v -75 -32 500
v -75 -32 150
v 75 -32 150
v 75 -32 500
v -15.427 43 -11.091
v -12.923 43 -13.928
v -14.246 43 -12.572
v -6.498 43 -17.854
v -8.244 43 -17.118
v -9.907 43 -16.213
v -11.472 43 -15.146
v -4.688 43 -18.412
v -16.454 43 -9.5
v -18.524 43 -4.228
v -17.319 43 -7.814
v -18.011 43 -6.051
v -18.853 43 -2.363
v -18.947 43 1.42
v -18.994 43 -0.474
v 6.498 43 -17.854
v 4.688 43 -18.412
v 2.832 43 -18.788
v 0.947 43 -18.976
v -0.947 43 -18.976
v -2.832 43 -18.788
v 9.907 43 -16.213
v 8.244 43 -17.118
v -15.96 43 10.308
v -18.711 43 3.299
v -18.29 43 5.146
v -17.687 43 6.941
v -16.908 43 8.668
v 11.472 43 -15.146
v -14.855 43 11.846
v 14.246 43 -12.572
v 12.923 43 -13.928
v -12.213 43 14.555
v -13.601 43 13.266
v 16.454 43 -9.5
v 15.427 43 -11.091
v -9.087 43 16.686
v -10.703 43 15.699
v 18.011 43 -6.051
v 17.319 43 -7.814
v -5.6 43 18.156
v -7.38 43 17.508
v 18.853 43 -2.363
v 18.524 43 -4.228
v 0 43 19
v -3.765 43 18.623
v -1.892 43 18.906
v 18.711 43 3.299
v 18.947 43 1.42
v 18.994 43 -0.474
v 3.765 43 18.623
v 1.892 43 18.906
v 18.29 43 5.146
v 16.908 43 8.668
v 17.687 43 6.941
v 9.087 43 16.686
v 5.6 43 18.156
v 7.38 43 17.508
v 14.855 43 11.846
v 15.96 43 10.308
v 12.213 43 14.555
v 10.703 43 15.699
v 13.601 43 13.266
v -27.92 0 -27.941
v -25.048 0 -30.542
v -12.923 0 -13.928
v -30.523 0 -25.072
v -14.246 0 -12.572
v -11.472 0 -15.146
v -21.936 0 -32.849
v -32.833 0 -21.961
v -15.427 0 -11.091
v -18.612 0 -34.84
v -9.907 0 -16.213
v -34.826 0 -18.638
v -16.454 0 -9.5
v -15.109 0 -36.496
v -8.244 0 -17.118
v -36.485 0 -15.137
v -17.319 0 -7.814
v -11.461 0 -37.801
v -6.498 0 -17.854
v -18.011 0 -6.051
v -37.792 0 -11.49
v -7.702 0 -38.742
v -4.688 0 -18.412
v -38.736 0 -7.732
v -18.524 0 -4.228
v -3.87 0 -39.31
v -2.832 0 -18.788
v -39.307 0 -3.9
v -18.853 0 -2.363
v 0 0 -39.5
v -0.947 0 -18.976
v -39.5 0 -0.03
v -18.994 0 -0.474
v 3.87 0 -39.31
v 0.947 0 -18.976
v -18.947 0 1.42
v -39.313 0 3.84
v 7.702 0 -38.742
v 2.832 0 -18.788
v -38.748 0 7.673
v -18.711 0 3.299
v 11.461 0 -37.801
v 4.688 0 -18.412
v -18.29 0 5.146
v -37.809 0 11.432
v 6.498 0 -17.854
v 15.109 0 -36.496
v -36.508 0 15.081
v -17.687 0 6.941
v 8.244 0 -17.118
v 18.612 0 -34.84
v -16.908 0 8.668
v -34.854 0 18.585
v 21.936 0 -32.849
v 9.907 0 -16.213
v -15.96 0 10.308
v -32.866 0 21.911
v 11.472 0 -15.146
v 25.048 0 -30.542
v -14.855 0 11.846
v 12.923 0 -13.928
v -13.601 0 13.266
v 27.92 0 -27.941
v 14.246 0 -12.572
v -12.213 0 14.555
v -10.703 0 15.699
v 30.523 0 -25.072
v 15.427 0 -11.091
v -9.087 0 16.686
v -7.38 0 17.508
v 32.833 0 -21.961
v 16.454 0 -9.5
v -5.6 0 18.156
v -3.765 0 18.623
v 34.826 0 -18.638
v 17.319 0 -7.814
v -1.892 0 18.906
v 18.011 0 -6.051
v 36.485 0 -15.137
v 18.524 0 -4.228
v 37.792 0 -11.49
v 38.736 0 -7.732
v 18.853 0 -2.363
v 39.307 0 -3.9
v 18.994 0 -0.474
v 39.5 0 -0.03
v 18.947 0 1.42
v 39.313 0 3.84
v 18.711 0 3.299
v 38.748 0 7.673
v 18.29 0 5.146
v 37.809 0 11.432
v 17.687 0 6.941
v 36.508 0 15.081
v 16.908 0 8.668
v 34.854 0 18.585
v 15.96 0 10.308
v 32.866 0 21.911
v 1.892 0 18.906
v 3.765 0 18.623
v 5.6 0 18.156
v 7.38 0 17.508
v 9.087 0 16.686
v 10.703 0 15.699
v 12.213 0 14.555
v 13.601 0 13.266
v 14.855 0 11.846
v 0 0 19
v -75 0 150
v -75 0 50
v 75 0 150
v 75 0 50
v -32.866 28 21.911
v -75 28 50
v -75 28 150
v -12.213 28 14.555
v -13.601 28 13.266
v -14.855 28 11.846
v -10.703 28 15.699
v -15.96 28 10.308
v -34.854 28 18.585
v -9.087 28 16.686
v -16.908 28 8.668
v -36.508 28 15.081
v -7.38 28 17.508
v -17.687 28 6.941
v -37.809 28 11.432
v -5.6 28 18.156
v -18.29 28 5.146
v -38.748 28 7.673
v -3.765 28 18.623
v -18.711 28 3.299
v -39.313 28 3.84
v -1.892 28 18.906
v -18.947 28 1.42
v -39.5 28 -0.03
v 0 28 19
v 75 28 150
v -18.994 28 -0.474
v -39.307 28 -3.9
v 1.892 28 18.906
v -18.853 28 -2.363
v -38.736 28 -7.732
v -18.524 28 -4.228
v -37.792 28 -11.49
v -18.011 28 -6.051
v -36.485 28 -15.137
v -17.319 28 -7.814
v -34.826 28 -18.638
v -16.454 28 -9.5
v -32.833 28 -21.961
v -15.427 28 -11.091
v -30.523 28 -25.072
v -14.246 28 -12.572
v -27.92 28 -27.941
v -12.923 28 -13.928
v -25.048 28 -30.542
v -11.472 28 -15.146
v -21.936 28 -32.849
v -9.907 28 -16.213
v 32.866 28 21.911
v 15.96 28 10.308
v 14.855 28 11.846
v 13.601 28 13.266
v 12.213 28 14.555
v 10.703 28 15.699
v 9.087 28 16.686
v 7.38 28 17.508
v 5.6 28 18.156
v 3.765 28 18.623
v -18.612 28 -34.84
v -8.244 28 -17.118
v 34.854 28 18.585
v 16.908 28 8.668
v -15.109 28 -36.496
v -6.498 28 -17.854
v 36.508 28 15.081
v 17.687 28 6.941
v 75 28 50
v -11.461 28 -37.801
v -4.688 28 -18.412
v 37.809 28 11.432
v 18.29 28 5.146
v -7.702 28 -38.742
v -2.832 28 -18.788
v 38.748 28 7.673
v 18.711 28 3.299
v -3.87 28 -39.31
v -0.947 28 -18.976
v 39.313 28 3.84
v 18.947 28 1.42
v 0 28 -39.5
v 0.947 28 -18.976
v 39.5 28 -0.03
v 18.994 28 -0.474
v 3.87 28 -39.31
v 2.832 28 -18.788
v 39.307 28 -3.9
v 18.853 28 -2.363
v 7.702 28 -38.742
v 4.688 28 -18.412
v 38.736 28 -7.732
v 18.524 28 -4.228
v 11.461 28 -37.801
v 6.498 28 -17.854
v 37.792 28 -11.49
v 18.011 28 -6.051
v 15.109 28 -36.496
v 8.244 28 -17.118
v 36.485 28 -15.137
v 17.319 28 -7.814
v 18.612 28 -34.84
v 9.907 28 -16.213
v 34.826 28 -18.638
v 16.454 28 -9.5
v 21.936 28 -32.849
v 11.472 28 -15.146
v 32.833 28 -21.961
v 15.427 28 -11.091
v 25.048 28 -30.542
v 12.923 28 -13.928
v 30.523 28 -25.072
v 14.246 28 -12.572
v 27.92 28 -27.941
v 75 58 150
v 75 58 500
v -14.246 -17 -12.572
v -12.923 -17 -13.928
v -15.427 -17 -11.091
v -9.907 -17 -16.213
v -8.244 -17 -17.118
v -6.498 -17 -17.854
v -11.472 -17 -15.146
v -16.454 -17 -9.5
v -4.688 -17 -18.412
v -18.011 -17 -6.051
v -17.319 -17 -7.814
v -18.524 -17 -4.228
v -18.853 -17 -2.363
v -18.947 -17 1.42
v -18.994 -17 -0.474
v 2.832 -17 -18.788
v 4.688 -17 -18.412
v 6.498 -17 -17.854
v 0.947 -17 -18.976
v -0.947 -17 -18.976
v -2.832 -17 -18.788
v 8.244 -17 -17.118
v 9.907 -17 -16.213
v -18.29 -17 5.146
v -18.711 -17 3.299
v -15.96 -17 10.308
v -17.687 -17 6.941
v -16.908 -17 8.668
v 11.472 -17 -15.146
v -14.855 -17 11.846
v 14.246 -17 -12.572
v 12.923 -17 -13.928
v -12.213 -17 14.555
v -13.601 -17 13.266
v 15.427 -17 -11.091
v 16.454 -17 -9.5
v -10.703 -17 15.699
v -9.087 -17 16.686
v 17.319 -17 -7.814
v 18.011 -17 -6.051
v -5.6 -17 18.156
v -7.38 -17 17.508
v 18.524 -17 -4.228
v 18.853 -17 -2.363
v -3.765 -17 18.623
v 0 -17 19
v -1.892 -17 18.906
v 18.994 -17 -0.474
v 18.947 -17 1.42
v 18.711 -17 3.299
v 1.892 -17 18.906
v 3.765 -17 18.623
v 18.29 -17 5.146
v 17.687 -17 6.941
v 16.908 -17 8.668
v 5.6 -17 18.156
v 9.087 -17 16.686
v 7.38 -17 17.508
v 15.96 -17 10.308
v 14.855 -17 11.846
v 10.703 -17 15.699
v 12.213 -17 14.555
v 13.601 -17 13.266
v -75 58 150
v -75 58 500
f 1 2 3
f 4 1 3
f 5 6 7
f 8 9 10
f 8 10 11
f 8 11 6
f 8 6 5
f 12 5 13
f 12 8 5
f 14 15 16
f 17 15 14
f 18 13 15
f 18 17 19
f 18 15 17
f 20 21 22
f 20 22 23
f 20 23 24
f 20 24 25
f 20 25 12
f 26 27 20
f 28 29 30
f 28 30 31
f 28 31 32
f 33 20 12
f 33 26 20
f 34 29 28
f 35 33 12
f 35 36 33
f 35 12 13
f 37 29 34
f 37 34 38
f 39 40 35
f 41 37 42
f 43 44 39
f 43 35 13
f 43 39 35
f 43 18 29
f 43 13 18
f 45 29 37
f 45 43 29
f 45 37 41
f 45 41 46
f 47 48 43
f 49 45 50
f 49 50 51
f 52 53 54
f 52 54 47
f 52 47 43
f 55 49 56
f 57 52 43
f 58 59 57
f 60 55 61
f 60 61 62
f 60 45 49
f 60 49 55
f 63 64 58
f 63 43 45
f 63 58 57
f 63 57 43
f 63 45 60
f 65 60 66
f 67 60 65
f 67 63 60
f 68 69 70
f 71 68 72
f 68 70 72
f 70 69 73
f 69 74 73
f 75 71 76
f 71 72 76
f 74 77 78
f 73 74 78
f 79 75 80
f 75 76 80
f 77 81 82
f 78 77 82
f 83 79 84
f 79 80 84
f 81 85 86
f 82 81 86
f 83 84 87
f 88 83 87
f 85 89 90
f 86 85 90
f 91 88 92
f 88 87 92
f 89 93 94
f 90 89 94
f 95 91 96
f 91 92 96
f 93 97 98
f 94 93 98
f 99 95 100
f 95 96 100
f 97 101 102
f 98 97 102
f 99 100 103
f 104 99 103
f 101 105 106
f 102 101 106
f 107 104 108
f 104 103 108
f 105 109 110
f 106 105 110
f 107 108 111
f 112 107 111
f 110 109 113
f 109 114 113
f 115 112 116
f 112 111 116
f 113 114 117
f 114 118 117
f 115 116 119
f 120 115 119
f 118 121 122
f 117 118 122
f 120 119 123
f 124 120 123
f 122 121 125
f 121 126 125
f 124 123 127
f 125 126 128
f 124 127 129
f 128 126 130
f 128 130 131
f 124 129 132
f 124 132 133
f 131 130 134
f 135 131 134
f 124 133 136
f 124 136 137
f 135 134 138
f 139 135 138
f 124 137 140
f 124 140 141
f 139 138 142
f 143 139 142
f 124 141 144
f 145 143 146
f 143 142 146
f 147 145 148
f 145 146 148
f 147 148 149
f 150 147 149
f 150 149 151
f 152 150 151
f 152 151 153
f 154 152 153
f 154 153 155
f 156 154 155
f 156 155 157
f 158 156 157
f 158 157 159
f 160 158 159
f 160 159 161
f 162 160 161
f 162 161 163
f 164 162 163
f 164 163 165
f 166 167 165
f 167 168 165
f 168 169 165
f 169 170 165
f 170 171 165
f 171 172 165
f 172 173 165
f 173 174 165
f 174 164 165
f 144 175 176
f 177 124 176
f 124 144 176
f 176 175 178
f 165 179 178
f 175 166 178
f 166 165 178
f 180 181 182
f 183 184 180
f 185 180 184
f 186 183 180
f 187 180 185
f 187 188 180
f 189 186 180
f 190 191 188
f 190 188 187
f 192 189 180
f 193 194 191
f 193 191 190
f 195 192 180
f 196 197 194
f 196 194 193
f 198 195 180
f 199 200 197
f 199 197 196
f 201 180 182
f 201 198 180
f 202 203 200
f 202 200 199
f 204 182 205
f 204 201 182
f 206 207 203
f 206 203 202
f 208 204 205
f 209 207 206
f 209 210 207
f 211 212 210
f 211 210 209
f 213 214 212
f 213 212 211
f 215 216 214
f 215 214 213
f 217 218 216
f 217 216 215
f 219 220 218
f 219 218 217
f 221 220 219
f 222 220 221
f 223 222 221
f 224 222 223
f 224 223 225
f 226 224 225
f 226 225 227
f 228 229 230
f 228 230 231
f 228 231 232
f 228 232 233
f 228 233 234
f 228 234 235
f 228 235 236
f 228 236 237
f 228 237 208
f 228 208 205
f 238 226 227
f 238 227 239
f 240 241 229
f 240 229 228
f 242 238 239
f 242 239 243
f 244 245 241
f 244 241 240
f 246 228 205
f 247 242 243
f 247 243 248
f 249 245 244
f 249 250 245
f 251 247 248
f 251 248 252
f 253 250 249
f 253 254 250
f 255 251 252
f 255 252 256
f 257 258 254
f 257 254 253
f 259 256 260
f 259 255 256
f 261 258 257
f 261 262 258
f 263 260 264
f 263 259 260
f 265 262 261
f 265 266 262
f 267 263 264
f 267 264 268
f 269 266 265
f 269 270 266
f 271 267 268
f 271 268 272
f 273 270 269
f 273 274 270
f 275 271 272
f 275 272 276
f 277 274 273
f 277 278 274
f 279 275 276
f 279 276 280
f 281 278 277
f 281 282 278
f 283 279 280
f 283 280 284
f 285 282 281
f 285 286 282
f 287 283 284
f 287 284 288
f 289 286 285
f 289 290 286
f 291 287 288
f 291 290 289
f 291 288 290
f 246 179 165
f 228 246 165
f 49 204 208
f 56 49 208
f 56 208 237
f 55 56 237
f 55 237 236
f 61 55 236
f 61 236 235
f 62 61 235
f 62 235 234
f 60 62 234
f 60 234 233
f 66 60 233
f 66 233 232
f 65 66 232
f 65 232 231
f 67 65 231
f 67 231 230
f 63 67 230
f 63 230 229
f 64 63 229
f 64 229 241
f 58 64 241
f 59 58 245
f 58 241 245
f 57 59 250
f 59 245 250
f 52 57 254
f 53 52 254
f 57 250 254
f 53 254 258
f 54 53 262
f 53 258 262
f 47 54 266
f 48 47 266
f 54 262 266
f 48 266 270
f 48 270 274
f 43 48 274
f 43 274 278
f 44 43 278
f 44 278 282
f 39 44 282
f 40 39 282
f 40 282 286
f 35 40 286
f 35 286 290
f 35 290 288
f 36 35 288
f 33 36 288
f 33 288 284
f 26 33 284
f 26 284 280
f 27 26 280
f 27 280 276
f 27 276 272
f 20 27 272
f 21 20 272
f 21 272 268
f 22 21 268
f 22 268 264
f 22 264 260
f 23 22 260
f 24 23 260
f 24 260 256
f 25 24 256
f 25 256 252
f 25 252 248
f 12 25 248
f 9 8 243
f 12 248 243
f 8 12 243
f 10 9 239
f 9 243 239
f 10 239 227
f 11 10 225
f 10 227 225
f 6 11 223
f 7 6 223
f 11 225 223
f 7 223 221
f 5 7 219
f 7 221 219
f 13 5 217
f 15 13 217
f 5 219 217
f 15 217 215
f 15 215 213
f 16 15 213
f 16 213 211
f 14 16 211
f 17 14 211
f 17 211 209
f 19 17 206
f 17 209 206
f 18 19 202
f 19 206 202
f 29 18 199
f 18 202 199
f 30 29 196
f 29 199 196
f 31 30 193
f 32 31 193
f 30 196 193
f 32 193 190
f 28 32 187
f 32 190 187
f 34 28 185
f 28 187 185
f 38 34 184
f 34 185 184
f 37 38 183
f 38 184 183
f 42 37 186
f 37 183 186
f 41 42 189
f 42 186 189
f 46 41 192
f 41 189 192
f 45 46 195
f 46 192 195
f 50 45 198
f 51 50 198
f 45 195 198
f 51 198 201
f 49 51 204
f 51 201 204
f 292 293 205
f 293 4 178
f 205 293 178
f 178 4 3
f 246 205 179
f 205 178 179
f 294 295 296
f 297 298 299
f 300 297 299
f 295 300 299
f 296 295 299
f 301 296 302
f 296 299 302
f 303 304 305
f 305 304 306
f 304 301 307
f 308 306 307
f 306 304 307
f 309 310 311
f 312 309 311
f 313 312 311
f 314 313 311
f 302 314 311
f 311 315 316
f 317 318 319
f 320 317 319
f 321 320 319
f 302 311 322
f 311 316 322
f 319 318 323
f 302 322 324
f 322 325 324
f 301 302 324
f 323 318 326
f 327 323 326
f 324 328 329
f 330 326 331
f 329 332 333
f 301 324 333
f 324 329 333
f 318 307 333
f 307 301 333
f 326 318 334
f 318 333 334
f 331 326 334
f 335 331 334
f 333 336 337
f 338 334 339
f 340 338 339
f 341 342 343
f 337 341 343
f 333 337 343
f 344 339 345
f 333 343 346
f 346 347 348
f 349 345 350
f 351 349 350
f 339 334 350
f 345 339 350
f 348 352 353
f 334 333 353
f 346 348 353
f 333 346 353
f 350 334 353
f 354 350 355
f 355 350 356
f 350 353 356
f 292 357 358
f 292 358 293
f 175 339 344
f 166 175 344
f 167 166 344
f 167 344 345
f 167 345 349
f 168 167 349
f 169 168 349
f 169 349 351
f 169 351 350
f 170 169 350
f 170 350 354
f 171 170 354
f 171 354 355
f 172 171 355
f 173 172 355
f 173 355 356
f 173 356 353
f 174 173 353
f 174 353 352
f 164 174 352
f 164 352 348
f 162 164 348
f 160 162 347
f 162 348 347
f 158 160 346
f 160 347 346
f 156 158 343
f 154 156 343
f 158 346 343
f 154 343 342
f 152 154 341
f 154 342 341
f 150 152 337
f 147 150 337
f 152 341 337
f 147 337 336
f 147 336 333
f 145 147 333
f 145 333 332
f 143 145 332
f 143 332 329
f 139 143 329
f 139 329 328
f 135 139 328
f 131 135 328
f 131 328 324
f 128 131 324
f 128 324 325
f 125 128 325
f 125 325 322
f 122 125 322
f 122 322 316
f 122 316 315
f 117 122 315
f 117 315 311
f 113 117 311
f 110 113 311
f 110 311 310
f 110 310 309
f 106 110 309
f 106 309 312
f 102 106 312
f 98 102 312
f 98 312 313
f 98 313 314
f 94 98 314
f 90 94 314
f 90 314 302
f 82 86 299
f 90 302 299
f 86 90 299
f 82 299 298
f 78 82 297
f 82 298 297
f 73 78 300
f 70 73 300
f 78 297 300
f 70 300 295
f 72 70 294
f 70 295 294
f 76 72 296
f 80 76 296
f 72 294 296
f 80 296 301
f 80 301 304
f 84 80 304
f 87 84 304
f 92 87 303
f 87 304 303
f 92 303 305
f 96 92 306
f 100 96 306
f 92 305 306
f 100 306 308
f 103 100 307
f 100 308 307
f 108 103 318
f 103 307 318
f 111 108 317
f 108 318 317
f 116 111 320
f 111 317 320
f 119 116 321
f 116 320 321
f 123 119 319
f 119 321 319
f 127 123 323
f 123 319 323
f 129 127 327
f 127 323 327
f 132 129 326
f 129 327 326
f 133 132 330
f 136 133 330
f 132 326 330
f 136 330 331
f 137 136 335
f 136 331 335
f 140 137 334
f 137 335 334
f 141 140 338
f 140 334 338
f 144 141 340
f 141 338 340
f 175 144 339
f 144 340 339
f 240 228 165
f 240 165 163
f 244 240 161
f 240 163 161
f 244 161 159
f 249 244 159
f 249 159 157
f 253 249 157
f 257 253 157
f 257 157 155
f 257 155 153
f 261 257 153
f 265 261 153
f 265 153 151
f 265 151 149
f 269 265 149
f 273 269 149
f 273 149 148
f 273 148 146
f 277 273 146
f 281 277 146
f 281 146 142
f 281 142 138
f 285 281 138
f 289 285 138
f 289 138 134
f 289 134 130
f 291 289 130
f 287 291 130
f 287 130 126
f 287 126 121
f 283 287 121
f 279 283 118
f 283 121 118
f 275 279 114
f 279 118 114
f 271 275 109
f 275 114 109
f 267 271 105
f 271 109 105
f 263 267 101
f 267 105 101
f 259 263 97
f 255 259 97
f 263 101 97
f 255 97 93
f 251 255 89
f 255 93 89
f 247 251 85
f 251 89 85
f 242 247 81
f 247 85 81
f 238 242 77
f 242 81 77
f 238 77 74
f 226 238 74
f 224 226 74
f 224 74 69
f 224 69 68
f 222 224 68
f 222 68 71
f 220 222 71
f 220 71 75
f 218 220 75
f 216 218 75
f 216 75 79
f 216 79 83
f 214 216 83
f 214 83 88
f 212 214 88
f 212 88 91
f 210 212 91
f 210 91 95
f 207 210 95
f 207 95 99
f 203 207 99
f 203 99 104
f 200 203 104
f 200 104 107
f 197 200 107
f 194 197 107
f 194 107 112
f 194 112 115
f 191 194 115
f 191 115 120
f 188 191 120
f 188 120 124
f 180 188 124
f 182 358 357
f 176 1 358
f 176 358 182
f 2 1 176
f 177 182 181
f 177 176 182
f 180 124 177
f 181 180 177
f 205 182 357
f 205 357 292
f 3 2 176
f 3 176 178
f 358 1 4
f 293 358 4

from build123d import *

# Parameters (mm, degrees)
SKETCH1_R                = 39.5
BOSS_EXTRUDE1_DEPTH      = 28
BOSS_EXTRUDE2_DEPTH      = 15
BOSS_EXTRUDE2_DEPTH_BACK = 45
SKETCH2_R                = 19
BOSS_EXTRUDE3_DEPTH      = 28
BOSS_EXTRUDE4_DEPTH      = 30
BOSS_EXTRUDE4_DEPTH_BACK = 60
SKETCH4_W                = 150
SKETCH4_H                = 350


with BuildPart() as part:
    # Sketch1 → Boss-Extrude1 (new body)
    with BuildSketch(Plane(origin=(0, 0, 0), x_dir=(1, 0, 0), z_dir=(0, 1, 0))):
        with Locations(Location((0, 0, 0), (0, 0, 270))):
            Circle(SKETCH1_R)
    extrude(amount=BOSS_EXTRUDE1_DEPTH)

    # Sketch2 → Boss-Extrude2 (add, two sides: drawn at the far end of the back side and taken through both)
    with BuildSketch(Plane(origin=(0, 28, 0), x_dir=(1, 0, 0), z_dir=(0, 1, 0)).offset(-BOSS_EXTRUDE2_DEPTH_BACK)):
        with Locations(Location((0, 0, 0), (0, 0, 270))):
            Circle(SKETCH2_R)
    extrude(amount=BOSS_EXTRUDE2_DEPTH + BOSS_EXTRUDE2_DEPTH_BACK)

    # Sketch3 → Boss-Extrude3 (add)
    with BuildSketch(Plane(origin=(0, 0, 0), x_dir=(1, 0, 0), z_dir=(0, 1, 0))):
        Polygon((0, 0), (-75, -50), (-75, -500), (75, -500), (75, -50), align=None)
    extrude(amount=BOSS_EXTRUDE3_DEPTH)

    # Sketch4 → Boss-Extrude4 (add, two sides: drawn at the far end of the back side and taken through both)
    with BuildSketch(Plane(origin=(0, 28, 0), x_dir=(1, 0, 0), z_dir=(0, 1, 0)).offset(-BOSS_EXTRUDE4_DEPTH_BACK)):
        with Locations((0, -325)):
            Rectangle(SKETCH4_W, SKETCH4_H)
    extrude(amount=BOSS_EXTRUDE4_DEPTH + BOSS_EXTRUDE4_DEPTH_BACK)


solid = part.part
